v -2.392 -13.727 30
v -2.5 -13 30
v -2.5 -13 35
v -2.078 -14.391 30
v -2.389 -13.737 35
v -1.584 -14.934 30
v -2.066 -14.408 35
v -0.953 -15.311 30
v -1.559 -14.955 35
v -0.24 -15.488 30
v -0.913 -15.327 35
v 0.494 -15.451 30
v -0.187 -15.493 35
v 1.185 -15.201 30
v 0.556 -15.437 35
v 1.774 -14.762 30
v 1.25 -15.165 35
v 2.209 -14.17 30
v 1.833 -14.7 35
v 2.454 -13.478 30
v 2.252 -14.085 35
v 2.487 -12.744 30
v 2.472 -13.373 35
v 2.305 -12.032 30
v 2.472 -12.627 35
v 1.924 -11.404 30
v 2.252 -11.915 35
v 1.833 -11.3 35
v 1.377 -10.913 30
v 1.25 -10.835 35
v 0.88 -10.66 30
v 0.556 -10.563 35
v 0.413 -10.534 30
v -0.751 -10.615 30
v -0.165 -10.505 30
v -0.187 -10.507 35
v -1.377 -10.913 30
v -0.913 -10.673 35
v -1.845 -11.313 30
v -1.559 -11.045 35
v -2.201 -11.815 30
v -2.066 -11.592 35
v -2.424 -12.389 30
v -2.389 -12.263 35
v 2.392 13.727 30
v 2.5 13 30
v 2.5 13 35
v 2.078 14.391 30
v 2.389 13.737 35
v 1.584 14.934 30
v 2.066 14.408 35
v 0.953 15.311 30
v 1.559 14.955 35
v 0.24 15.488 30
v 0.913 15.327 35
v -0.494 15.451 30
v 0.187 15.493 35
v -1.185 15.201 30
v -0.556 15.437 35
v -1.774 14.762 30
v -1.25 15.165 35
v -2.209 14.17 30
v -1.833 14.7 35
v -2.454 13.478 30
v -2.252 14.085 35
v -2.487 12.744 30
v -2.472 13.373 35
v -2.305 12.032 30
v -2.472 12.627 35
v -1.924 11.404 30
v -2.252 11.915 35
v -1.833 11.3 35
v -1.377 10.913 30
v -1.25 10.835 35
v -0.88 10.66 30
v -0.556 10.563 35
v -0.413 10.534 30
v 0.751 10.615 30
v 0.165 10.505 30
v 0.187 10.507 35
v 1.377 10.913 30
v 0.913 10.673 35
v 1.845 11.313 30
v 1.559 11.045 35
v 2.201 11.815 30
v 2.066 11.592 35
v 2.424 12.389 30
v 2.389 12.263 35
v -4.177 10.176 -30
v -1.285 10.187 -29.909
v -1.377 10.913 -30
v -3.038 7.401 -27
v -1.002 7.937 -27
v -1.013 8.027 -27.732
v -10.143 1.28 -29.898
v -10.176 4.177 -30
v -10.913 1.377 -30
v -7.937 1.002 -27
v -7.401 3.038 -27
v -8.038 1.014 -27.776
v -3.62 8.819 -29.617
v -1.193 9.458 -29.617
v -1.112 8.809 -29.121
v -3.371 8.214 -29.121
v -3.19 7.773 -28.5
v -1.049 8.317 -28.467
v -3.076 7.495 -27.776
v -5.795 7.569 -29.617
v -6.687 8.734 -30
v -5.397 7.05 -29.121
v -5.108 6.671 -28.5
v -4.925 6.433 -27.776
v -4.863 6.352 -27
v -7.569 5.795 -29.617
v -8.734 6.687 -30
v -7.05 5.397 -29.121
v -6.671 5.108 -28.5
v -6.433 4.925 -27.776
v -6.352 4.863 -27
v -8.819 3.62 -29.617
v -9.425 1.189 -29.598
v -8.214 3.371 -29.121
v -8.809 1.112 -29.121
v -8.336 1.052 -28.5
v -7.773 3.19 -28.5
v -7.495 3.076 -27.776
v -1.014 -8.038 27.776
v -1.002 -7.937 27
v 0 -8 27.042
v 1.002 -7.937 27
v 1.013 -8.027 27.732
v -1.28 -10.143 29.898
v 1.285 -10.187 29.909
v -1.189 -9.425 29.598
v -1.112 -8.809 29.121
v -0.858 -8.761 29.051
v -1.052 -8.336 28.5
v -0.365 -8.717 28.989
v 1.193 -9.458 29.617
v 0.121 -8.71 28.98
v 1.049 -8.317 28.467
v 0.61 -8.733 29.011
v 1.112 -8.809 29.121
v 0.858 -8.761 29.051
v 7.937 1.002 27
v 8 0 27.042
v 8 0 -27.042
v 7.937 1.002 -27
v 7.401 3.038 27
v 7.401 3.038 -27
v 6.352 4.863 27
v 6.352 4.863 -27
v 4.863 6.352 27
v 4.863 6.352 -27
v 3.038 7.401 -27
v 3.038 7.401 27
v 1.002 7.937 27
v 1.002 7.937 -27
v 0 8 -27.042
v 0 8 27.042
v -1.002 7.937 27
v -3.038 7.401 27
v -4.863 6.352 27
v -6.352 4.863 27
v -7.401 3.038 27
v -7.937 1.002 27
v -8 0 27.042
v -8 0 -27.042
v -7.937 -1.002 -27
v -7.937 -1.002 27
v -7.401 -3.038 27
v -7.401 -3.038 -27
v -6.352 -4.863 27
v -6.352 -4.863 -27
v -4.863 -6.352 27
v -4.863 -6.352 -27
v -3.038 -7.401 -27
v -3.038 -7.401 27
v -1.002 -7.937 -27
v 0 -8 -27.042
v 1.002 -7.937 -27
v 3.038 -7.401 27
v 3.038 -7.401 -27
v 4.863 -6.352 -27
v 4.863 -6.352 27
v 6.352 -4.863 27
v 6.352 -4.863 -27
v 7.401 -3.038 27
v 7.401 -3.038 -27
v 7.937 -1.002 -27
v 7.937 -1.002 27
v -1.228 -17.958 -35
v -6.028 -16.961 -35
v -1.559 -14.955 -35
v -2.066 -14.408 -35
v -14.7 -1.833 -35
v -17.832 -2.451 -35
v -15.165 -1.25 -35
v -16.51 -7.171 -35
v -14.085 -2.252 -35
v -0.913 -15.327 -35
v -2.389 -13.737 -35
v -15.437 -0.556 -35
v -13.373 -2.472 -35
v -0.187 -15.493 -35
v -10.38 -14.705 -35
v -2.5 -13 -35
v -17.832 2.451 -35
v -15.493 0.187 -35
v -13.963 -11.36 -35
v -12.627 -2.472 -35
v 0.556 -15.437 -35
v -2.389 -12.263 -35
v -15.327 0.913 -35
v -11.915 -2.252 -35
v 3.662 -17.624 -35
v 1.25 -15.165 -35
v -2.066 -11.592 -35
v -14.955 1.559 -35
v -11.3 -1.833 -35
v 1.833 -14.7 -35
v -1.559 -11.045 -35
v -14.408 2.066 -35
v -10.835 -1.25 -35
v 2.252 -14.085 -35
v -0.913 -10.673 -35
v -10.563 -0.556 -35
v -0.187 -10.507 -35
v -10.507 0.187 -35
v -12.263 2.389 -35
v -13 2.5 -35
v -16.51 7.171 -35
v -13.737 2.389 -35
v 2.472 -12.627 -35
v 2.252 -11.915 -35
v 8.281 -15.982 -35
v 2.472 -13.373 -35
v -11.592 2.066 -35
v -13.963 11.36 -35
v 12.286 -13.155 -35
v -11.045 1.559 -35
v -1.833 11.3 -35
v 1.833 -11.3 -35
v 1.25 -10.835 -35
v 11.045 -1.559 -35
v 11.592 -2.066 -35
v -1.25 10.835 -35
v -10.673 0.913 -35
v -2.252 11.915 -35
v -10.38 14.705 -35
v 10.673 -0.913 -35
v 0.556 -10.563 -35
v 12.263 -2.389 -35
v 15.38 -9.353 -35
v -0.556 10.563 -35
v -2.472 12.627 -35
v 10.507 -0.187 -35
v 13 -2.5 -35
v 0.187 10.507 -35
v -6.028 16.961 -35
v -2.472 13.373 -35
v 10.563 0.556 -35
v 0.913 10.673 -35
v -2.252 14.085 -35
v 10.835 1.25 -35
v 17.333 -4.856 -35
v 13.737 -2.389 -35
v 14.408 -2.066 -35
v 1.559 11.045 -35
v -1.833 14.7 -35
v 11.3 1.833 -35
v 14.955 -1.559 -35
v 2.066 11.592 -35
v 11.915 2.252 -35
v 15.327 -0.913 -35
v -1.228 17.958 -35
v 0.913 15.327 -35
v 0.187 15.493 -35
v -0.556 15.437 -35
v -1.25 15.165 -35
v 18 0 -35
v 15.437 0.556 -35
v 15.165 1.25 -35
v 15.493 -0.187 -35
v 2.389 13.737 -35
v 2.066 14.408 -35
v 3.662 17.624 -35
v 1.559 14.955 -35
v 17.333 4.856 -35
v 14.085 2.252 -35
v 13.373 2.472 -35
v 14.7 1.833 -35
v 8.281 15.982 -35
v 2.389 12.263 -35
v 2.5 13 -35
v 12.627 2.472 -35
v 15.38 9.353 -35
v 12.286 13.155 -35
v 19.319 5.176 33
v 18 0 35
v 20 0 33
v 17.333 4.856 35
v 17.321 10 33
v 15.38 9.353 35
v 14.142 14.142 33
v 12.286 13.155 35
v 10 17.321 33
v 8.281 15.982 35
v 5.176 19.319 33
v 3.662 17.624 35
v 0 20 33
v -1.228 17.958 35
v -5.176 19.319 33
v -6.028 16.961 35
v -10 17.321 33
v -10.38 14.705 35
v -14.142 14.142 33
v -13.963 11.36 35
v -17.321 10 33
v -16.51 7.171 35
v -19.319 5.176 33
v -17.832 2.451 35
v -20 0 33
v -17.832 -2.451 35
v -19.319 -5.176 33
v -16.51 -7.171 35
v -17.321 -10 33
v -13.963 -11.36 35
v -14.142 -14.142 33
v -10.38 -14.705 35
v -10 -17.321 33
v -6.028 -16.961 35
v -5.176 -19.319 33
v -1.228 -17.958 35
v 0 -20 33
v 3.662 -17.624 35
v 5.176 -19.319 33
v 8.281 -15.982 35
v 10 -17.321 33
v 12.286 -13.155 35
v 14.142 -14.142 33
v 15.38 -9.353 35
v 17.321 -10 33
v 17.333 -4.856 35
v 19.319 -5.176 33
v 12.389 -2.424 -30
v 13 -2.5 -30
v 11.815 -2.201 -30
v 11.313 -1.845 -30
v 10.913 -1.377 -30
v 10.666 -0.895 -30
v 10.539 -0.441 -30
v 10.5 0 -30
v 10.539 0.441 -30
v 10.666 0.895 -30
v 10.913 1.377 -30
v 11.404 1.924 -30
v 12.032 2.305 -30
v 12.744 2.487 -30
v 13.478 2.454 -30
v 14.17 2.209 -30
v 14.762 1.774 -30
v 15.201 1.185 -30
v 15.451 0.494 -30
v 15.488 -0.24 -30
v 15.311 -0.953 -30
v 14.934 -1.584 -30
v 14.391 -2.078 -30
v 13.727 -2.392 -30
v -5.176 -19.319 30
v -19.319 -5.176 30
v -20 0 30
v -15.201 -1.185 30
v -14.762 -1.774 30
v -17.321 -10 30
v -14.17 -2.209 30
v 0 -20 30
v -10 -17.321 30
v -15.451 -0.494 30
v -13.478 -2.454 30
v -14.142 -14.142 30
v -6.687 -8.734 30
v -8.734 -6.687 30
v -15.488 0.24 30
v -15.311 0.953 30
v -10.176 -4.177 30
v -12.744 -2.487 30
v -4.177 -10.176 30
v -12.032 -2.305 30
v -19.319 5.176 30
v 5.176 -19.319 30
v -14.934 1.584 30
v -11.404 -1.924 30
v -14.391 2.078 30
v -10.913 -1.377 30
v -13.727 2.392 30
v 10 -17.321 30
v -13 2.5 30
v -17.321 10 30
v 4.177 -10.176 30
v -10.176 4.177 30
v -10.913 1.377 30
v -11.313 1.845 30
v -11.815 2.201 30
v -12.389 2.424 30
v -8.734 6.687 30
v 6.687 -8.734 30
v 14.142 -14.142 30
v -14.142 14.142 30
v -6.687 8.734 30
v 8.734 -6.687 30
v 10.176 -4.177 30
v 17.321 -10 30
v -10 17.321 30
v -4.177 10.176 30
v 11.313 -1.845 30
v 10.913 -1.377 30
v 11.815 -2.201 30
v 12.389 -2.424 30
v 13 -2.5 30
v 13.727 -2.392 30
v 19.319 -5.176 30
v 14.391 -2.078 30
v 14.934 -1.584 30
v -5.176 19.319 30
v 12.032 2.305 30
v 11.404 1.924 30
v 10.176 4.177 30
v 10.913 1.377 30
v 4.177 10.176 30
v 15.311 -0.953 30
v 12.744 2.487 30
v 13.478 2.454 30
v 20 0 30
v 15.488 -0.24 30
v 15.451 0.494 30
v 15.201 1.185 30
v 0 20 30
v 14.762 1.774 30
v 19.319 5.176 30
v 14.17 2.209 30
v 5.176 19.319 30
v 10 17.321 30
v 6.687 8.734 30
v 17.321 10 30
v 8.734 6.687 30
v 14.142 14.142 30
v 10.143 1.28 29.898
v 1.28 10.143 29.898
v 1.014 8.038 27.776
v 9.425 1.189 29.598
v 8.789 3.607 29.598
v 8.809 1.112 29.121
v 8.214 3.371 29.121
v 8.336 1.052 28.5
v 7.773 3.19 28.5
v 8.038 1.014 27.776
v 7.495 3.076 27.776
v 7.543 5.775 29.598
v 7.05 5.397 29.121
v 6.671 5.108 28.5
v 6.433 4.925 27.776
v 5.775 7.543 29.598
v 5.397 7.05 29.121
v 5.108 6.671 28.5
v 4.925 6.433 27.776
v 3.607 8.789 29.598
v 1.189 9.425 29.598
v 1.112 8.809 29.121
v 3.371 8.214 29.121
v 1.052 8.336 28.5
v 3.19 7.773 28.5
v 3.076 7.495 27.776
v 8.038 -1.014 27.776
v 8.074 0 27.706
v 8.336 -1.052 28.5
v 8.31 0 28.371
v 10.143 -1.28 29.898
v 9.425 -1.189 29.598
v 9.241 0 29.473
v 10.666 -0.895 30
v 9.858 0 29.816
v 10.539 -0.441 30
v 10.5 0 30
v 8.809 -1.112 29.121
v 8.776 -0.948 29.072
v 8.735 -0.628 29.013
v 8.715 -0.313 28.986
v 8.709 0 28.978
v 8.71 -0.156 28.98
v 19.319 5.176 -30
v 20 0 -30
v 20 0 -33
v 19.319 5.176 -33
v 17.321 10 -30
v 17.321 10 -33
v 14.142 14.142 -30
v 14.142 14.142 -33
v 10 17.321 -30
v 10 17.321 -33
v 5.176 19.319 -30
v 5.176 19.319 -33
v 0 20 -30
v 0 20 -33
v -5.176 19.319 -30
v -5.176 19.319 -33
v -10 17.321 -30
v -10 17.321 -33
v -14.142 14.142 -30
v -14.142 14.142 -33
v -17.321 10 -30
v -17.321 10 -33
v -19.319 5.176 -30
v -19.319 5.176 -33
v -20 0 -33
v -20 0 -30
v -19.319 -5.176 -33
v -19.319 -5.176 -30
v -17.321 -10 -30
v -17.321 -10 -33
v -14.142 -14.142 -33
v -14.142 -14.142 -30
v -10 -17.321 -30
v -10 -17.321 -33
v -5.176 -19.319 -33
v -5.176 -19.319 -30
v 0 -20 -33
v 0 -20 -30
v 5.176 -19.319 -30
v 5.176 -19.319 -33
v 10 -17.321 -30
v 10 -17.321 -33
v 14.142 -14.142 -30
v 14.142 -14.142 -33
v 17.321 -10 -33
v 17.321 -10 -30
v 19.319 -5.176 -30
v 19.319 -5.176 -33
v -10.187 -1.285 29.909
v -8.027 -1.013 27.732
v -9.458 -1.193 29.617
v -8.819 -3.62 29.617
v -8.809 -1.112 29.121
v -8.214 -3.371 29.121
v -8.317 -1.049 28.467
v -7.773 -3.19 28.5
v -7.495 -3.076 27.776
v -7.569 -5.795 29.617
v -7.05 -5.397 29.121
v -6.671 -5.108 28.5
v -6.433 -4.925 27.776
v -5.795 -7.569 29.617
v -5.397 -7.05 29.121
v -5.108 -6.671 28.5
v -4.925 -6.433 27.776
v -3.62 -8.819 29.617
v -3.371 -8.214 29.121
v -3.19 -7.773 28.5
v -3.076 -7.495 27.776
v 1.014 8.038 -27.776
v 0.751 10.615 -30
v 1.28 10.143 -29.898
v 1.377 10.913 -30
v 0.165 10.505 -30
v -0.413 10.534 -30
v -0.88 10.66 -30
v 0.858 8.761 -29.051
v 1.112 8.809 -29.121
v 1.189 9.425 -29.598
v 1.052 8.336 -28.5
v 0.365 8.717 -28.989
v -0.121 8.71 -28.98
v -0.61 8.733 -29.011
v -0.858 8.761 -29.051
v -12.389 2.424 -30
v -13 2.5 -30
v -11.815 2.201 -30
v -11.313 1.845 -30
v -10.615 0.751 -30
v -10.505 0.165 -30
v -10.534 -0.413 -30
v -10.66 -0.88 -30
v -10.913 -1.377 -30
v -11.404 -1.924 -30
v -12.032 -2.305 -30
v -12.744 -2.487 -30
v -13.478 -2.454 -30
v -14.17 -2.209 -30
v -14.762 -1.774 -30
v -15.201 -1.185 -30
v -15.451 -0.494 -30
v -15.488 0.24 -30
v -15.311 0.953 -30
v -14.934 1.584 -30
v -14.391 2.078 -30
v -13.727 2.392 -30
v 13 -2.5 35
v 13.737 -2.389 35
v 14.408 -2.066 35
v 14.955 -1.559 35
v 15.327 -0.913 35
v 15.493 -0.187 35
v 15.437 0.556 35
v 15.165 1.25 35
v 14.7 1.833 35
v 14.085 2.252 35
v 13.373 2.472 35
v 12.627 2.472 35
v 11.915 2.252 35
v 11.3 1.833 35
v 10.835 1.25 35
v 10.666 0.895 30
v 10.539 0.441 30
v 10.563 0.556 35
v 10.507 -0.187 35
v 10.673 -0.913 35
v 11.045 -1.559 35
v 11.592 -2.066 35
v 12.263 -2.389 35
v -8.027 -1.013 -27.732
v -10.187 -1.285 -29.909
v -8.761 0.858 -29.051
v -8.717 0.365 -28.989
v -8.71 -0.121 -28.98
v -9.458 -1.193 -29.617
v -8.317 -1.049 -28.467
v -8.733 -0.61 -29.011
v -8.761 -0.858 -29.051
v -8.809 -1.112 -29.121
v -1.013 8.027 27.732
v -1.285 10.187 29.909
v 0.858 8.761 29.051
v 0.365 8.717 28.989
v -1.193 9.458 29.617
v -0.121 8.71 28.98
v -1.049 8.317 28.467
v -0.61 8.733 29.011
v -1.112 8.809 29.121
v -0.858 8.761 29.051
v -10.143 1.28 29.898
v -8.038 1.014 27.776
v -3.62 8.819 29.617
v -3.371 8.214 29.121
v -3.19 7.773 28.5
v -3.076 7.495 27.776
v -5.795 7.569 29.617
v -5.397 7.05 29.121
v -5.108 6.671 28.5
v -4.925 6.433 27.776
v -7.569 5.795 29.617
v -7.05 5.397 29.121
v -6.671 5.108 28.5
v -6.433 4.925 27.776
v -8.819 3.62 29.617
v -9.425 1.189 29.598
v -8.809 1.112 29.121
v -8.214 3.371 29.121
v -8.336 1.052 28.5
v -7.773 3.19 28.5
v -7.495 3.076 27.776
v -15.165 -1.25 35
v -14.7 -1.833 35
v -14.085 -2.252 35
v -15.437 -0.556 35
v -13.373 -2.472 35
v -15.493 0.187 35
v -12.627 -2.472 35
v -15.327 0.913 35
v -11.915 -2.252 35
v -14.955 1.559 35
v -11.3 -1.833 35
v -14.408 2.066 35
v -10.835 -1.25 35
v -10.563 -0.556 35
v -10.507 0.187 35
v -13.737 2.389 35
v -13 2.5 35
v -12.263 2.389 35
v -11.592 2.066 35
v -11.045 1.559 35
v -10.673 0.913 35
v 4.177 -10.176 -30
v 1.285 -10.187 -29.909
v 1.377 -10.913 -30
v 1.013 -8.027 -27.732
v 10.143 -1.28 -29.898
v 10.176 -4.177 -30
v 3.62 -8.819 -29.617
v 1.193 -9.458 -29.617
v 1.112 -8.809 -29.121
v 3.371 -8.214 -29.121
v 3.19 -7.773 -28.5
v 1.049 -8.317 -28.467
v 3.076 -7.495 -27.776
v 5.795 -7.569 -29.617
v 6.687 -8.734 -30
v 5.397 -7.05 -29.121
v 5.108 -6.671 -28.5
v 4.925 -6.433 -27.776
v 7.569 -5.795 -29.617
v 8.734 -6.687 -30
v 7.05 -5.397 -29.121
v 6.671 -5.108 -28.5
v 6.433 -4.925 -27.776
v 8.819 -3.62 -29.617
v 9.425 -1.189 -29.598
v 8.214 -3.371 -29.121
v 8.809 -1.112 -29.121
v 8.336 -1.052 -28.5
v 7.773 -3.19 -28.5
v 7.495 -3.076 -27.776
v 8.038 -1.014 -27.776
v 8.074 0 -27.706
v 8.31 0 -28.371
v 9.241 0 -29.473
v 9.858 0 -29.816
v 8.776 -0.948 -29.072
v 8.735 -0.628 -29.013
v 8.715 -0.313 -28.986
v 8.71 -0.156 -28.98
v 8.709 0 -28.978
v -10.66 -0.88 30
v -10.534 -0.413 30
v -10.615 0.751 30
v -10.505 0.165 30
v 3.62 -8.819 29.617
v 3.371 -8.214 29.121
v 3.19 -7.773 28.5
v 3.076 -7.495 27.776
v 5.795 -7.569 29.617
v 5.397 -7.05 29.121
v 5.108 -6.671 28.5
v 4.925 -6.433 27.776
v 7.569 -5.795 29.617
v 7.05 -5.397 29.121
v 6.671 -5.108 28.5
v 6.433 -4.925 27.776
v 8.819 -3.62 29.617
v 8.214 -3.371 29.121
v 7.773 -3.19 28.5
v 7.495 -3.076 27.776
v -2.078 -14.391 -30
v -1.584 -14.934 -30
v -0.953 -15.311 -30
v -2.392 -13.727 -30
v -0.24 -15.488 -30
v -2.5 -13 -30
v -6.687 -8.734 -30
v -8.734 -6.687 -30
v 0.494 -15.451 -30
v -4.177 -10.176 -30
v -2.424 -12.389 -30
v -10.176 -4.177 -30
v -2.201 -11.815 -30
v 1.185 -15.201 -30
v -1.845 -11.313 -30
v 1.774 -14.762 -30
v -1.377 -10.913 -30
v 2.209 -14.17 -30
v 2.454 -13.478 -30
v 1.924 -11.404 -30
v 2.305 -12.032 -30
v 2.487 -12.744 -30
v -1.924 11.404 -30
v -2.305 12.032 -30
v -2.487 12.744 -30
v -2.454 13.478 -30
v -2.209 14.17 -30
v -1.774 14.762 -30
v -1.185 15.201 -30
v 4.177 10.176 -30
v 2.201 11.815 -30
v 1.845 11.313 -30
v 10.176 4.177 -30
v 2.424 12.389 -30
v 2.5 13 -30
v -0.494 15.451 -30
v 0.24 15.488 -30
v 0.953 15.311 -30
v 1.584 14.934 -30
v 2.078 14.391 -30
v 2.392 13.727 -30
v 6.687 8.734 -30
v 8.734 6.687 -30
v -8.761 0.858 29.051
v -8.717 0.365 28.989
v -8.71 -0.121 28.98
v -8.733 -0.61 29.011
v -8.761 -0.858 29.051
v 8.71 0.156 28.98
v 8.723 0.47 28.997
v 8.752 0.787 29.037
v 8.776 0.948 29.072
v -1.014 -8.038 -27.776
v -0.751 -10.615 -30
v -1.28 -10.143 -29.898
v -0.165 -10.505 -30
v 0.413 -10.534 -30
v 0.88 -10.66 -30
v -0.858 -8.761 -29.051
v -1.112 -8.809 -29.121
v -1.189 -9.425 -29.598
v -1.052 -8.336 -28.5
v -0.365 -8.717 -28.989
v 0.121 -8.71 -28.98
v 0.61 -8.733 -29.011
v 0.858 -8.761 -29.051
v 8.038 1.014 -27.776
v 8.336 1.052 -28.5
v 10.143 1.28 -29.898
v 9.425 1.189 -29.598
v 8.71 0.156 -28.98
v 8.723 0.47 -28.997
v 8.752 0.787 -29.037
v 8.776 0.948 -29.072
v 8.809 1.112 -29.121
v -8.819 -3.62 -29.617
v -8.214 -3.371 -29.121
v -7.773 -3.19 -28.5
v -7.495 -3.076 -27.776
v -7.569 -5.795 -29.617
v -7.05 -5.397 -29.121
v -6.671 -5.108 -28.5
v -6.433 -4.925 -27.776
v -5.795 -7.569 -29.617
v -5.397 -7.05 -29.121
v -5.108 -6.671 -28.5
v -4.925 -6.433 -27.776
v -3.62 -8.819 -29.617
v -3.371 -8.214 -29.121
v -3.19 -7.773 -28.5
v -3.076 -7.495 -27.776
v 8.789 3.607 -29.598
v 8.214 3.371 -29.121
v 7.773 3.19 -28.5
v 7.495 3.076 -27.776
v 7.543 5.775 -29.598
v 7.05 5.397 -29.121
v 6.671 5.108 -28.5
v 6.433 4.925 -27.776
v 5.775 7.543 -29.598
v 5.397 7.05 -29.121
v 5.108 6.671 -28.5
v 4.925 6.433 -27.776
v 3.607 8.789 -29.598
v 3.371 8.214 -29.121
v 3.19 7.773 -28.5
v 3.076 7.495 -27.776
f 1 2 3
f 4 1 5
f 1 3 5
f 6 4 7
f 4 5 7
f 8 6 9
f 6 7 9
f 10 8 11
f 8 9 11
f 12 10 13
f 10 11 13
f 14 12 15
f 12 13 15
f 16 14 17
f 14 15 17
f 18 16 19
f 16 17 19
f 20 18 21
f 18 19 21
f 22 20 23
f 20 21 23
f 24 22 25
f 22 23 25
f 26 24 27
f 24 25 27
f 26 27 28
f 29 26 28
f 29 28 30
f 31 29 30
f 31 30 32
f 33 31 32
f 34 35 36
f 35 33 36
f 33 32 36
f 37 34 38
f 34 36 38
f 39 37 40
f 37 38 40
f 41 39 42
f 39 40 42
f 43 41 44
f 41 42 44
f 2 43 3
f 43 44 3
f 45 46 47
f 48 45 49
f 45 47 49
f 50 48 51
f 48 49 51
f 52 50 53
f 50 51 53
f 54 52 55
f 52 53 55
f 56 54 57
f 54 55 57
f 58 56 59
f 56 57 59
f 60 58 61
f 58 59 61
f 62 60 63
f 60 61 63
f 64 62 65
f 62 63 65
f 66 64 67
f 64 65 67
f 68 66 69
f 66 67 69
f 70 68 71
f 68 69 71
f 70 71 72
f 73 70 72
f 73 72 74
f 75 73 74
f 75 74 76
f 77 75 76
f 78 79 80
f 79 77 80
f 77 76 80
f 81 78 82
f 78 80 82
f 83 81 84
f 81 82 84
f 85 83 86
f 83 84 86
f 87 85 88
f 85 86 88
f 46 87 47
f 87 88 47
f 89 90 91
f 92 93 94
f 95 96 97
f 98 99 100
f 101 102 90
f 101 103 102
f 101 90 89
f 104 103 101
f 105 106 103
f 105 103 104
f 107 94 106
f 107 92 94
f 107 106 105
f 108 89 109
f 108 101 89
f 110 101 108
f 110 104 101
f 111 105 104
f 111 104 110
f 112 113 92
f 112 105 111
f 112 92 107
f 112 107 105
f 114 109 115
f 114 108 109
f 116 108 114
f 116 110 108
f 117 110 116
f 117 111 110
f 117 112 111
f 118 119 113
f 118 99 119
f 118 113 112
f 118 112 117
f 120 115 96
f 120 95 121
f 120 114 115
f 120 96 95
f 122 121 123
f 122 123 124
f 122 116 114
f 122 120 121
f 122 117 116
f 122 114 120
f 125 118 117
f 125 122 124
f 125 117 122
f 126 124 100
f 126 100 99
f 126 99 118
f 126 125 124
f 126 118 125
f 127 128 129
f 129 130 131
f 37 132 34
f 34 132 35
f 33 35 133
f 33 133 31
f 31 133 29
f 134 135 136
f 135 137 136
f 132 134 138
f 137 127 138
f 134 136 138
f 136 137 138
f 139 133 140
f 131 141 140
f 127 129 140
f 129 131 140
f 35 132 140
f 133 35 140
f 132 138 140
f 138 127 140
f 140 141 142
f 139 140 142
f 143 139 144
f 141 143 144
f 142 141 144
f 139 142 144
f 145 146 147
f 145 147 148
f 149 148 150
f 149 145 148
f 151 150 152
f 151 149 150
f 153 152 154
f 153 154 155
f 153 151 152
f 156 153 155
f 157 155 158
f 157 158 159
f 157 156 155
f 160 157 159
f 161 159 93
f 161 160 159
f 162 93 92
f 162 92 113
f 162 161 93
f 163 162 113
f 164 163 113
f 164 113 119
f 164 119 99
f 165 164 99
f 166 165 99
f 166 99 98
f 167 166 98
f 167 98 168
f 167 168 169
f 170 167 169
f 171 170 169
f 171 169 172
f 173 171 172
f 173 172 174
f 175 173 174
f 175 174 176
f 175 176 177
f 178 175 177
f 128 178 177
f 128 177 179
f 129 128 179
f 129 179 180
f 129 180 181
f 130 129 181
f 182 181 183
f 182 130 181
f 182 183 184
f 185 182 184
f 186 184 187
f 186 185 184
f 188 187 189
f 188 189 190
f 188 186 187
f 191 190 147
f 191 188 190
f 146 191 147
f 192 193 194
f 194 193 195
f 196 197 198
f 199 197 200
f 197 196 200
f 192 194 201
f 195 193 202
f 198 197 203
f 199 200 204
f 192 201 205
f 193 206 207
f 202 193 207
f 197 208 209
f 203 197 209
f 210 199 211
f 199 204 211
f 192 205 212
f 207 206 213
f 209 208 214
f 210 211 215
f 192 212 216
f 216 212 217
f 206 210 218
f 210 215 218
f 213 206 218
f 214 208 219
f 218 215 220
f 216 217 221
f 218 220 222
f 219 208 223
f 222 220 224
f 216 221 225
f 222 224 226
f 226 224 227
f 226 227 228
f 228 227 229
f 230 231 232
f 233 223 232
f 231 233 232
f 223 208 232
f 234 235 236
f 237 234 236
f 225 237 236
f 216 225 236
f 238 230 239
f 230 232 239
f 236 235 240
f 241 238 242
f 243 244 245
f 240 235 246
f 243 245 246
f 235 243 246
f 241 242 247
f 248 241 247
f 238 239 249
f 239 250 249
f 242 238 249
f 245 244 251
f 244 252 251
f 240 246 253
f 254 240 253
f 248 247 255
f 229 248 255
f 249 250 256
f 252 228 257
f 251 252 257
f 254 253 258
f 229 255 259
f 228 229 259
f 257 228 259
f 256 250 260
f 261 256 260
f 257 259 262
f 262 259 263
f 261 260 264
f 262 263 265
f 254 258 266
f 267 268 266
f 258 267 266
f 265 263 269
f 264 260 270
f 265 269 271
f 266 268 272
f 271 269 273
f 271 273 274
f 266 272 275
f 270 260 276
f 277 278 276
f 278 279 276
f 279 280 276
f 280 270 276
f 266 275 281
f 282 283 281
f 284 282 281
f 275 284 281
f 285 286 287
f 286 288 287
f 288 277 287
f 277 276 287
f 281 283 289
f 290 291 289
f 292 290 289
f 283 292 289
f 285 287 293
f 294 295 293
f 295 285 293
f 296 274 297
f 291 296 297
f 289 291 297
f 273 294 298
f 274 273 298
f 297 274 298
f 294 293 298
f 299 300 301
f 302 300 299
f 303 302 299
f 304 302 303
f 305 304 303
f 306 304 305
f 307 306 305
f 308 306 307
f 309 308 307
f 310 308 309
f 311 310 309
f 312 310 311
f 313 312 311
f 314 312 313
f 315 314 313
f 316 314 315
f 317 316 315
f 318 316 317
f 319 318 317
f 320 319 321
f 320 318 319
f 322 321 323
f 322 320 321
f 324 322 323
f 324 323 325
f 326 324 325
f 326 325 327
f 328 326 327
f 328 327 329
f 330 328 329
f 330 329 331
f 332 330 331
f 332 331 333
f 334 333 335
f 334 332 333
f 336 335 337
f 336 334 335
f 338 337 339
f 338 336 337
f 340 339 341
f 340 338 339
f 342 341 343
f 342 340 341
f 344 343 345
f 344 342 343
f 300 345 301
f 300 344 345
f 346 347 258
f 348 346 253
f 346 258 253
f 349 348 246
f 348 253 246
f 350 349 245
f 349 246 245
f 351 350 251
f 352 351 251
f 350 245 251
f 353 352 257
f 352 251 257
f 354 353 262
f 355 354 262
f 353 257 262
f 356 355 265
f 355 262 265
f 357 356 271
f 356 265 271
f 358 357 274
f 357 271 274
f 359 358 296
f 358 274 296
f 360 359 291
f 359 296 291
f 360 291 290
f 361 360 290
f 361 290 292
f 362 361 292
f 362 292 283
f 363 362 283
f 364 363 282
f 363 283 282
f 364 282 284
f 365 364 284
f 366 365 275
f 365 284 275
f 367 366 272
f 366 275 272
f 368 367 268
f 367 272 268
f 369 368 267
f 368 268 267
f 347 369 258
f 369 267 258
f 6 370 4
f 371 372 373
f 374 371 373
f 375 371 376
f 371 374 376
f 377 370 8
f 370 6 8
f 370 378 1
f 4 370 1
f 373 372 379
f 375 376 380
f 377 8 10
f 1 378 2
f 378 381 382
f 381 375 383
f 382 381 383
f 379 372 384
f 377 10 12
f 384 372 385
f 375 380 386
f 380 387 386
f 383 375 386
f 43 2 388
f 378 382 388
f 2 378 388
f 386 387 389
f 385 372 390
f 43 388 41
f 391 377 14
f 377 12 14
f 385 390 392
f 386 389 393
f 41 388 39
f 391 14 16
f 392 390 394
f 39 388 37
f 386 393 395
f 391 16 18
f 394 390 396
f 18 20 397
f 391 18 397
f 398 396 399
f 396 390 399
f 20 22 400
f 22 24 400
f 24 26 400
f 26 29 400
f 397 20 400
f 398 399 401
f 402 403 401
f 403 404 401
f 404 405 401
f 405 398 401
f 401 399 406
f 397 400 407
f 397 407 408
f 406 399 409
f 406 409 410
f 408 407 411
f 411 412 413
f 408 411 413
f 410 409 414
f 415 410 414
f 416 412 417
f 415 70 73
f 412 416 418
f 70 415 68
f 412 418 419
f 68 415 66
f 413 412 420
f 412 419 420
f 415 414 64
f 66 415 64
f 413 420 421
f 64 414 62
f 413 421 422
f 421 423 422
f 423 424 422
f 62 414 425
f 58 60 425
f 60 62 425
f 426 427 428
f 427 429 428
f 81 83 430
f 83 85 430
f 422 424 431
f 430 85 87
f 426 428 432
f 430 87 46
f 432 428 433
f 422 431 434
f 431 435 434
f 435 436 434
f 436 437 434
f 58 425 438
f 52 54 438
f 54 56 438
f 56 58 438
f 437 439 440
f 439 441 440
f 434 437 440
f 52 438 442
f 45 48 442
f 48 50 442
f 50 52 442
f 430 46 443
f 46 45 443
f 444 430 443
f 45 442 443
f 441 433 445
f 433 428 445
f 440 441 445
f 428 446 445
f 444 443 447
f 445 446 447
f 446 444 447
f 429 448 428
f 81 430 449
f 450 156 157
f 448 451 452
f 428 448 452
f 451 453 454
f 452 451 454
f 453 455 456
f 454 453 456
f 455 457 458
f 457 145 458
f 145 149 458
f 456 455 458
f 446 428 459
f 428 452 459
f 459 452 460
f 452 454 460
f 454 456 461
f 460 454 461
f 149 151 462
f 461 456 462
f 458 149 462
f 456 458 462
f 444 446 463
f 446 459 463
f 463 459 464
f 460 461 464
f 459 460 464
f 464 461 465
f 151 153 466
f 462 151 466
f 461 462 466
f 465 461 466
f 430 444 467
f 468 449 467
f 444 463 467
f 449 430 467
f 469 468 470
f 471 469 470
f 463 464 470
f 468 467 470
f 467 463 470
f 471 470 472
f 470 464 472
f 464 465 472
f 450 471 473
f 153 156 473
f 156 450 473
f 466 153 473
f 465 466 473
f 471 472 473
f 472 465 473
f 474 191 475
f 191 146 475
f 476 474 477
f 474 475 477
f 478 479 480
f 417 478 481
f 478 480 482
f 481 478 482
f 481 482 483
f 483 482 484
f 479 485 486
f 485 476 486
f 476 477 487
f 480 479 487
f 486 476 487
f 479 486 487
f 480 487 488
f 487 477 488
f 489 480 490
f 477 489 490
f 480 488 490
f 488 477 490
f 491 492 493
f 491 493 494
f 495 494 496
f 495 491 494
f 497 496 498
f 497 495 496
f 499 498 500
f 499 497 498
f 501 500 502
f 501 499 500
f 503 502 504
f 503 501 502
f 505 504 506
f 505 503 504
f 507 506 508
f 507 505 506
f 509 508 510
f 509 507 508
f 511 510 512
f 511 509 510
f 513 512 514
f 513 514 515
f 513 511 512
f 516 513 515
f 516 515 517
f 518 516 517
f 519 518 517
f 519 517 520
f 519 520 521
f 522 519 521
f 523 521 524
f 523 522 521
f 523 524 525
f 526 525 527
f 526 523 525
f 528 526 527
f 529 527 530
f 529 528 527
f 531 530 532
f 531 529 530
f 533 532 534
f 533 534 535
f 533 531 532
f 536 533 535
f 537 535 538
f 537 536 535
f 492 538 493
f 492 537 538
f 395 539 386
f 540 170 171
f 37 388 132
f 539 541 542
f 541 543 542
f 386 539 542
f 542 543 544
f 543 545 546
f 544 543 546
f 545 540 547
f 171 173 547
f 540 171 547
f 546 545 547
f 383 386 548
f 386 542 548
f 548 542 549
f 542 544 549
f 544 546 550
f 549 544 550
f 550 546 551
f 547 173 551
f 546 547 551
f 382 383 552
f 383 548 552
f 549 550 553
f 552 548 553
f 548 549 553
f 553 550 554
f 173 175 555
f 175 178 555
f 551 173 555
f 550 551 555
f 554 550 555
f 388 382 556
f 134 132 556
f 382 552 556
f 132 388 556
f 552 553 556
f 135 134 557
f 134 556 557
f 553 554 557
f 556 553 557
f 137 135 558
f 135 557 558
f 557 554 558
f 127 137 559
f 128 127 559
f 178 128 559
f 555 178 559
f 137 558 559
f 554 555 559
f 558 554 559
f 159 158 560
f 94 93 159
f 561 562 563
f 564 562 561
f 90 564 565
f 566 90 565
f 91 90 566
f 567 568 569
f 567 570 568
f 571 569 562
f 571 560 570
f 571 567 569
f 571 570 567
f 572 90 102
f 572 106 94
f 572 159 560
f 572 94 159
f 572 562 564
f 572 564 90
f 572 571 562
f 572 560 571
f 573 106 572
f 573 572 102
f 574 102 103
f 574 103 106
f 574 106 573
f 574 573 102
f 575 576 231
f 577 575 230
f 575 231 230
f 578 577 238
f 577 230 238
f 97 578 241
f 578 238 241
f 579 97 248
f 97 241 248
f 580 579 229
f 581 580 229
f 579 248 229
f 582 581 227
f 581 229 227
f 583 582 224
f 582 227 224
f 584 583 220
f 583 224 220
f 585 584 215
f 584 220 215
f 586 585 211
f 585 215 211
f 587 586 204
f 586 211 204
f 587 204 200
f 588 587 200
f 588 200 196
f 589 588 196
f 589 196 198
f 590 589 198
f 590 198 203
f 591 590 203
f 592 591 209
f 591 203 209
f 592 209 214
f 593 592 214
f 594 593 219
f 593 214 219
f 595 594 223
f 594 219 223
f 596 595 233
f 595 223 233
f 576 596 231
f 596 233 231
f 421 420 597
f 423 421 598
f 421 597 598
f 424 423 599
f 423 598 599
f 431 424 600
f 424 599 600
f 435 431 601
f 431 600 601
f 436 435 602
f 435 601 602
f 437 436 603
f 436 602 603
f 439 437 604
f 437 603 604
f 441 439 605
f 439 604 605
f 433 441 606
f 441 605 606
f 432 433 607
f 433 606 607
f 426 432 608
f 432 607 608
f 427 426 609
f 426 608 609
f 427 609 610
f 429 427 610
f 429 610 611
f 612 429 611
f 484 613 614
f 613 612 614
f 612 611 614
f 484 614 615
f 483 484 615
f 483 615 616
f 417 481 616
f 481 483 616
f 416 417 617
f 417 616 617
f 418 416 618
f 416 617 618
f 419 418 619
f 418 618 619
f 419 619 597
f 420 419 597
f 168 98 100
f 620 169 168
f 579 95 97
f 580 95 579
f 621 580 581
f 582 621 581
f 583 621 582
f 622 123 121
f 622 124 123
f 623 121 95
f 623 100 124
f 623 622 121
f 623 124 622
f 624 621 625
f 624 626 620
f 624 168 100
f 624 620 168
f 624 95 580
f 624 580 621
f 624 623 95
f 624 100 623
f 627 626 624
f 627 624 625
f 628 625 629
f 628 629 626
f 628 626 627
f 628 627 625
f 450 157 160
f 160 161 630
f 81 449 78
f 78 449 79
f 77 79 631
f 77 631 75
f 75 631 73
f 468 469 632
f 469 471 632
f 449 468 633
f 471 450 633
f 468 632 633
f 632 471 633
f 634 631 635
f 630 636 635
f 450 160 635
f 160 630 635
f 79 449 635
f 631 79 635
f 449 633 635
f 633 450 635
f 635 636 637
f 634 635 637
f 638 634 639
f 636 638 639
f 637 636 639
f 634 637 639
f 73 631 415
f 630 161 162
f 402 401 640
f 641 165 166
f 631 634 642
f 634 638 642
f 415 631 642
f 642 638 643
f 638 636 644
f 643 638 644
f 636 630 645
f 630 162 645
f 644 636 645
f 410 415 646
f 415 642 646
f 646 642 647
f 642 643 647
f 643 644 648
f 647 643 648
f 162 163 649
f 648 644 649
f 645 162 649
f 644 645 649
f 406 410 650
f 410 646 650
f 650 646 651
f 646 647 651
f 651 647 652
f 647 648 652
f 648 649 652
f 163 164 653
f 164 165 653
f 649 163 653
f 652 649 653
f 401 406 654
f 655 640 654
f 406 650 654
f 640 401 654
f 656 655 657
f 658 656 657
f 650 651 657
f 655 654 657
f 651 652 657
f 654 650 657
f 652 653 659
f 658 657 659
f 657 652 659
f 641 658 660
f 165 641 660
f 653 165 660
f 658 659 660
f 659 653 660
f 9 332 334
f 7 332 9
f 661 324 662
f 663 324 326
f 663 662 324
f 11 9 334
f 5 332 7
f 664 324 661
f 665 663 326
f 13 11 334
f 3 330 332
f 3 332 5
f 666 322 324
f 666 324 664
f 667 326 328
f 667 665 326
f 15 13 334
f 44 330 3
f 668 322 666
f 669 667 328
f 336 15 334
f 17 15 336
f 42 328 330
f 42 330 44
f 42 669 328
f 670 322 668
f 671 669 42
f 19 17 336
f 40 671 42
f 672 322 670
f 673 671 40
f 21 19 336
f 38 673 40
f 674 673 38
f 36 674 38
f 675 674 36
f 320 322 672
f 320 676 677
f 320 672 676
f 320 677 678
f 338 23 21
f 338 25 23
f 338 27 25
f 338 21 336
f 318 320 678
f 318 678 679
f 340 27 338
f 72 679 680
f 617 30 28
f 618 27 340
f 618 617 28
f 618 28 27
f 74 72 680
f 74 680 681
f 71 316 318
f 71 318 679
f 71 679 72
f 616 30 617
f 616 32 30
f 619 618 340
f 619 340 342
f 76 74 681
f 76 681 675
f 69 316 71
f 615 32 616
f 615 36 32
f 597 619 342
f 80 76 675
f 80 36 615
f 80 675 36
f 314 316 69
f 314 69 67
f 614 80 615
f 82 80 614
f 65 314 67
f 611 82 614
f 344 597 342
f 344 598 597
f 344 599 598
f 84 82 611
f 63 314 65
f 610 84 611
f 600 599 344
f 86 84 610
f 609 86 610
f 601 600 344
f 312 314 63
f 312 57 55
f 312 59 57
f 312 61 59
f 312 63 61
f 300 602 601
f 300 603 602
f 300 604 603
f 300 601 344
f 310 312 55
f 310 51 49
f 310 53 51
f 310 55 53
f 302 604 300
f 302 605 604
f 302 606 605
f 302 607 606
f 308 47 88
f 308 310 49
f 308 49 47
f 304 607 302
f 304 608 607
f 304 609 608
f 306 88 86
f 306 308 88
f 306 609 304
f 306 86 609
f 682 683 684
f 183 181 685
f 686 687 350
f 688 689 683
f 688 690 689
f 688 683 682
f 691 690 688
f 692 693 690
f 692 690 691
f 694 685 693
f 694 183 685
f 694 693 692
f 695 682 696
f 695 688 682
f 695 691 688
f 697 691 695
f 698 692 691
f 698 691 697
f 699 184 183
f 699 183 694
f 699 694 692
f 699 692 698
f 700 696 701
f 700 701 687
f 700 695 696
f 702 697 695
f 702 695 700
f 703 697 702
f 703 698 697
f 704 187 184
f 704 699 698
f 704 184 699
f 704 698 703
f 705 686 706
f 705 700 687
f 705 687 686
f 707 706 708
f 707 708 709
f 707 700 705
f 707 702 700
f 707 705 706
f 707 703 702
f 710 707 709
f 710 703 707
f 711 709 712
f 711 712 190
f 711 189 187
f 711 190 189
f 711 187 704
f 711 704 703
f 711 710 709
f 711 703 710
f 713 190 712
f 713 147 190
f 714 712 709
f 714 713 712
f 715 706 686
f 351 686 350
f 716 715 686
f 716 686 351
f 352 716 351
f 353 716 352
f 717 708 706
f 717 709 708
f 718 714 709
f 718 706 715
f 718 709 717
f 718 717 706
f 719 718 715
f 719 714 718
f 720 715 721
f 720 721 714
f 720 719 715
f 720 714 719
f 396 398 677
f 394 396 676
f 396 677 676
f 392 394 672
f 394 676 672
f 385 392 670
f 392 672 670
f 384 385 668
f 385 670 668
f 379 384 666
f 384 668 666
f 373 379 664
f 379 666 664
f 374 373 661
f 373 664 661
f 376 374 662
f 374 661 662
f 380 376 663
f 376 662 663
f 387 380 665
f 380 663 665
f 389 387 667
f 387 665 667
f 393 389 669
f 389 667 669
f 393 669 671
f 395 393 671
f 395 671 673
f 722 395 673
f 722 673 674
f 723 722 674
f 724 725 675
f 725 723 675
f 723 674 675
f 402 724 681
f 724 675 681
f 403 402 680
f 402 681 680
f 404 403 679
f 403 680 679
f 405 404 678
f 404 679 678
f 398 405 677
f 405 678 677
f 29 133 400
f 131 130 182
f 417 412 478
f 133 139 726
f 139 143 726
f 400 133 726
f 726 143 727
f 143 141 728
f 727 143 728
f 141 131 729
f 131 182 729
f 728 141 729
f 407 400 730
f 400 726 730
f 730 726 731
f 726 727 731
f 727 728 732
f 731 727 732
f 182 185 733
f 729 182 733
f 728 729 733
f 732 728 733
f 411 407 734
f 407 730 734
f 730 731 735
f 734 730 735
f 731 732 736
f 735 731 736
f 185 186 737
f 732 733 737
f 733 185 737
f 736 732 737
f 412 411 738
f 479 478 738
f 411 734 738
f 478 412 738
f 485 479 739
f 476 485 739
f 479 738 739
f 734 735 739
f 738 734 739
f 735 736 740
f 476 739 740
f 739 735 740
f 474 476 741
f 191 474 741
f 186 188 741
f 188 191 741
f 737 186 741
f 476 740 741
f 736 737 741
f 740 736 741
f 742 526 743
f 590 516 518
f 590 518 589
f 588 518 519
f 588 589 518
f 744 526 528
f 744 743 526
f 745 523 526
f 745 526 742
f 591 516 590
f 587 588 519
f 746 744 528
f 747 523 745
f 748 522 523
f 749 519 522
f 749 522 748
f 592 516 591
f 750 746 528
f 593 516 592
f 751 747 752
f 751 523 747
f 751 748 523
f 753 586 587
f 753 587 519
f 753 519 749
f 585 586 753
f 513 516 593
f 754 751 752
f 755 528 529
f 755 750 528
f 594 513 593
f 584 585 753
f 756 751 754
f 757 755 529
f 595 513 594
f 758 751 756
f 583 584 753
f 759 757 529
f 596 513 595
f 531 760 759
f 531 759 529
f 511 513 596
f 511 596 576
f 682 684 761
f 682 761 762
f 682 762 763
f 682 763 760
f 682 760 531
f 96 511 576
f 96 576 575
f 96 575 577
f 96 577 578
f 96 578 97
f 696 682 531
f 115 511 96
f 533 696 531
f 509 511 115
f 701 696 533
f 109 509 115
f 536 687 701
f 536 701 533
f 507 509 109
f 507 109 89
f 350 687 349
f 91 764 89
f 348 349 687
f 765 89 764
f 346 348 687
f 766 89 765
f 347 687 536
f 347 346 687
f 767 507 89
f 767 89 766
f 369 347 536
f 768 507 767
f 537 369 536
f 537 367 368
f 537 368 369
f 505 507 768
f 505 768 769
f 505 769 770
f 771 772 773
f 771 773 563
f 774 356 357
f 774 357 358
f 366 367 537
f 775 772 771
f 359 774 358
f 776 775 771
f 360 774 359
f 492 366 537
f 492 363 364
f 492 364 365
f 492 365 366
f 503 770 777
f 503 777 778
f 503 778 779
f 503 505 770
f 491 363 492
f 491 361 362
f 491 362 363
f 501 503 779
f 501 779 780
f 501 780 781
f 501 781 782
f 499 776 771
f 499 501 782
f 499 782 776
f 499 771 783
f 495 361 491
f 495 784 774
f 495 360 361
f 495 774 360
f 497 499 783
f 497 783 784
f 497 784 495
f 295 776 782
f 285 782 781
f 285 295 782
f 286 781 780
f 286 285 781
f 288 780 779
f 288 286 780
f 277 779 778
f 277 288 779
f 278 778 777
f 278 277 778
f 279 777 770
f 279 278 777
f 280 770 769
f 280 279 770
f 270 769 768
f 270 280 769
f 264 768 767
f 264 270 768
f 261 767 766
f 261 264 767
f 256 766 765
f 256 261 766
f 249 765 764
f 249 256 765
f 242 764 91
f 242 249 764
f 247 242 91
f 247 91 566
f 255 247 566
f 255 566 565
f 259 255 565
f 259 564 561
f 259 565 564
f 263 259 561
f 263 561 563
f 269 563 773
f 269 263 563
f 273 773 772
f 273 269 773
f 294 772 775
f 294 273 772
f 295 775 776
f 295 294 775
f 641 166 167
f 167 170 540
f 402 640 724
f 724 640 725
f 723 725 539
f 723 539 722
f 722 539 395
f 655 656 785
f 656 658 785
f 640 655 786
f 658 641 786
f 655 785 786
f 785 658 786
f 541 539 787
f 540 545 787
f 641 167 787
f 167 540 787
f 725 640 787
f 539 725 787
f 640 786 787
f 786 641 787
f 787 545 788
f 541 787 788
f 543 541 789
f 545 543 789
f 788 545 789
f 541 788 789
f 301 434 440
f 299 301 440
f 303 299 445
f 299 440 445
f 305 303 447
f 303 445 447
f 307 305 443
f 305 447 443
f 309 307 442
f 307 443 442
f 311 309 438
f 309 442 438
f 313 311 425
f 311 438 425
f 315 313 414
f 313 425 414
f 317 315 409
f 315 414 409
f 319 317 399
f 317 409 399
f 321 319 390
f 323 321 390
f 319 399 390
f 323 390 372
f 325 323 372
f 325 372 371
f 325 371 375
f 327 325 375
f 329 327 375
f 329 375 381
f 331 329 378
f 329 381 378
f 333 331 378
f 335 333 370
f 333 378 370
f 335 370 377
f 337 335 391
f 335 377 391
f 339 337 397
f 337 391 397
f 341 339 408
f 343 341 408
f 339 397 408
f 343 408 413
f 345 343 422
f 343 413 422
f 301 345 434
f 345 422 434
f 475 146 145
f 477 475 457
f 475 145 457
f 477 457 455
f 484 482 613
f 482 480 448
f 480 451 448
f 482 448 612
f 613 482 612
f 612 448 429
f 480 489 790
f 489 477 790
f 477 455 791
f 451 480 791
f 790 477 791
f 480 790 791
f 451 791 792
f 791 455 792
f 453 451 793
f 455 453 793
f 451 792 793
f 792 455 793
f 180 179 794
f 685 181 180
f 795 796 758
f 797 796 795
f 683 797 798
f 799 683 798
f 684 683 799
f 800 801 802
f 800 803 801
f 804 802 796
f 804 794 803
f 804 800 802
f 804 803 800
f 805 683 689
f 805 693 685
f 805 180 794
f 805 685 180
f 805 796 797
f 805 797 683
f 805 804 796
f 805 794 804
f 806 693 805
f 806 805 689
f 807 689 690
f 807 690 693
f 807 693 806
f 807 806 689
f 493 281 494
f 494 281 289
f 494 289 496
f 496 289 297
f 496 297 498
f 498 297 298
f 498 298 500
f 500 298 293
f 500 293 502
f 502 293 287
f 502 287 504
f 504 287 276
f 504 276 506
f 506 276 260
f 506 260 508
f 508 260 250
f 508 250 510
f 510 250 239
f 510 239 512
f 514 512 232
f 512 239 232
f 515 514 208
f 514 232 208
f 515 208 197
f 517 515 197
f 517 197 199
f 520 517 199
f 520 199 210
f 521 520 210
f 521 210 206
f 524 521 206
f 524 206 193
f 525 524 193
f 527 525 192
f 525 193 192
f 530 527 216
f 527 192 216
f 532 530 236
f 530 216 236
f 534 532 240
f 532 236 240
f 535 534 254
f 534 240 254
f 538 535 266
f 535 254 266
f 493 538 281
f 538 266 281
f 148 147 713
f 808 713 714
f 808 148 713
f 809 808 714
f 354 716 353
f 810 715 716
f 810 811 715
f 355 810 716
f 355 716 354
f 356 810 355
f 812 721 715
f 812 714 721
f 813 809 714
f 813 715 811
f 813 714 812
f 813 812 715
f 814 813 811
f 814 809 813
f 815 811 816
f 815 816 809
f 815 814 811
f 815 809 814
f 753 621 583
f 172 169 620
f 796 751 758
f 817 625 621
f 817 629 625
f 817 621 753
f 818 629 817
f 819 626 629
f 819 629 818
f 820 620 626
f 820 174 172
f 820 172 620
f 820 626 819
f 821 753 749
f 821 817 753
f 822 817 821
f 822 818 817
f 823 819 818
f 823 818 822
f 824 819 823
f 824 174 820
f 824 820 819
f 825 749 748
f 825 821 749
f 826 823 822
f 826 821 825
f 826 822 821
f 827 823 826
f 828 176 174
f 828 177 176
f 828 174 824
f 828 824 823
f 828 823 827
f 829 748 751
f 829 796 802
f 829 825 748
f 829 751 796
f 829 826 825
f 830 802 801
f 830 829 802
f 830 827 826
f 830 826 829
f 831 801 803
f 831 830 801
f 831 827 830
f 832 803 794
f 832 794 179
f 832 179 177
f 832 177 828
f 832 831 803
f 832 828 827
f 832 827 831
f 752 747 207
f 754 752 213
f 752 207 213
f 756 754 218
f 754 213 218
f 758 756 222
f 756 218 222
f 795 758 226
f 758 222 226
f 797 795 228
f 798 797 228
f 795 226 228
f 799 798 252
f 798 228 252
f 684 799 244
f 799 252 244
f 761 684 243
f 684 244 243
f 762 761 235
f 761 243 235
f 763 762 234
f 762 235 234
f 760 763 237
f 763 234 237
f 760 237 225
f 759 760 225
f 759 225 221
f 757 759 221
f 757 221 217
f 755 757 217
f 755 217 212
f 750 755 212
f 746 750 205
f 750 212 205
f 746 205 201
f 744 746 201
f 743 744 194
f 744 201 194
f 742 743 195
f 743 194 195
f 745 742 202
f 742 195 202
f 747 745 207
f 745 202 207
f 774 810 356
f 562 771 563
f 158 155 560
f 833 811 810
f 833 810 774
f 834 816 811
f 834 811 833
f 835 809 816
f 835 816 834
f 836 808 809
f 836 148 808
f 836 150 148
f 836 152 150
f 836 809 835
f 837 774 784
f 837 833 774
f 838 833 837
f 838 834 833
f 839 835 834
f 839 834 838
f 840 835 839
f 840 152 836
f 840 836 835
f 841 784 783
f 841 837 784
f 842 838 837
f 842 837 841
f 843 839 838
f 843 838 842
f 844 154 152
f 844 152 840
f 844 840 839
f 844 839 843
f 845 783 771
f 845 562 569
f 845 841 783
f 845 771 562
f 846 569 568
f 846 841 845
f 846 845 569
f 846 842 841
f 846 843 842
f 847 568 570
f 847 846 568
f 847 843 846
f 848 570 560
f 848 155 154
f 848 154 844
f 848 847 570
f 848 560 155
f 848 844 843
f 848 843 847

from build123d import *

# Parameters (mm, degrees)
SKETCH1_R                = 8
BOSS_EXTRUDE1_DEPTH      = 30
SKETCH2_R                = 20
BOSS_EXTRUDE2_DEPTH      = 5
CHAMFER1_SIZE            = 2
SKETCH3_R                = 2.5
CUT_EXTRUDE1_DEPTH       = 71.887234394
CIRPATTERN1_COUNT        = 4
FILLET1_R                = 3
MIRROR5_COPY_1_SKETCH_R  = 2.5
MIRROR5_COPY_1_DEPTH     = 71.887234394
MIRROR5_COPY_2_SKETCH_R  = 2.5
MIRROR5_COPY_2_DEPTH     = 71.887234394
MIRROR5_COPY_3_SKETCH_R  = 2.5
MIRROR5_COPY_3_DEPTH     = 71.887234394
CHAMFER1_OF_MIRROR5_SIZE = 2
FILLET1_OF_MIRROR5_R     = 3


with BuildPart() as part:
    # Sketch1 → Boss-Extrude1 (new, symmetric)
    with BuildSketch(Plane.XY):
        Circle(SKETCH1_R)
    extrude(amount=BOSS_EXTRUDE1_DEPTH, both=True)

    # Sketch2 → Boss-Extrude2 (add)
    with BuildSketch(Plane.XY.offset(30)):
        Circle(SKETCH2_R)
    boss_extrude2 = extrude(amount=BOSS_EXTRUDE2_DEPTH)

    # Chamfer1
    chamfer1_edges = [part.edges().sort_by_distance(p)[0] for p in [
        (-20, 0, 35),
    ]]
    chamfer(chamfer1_edges, length=CHAMFER1_SIZE)

    # Sketch3 → Cut-Extrude1 (cut, through all)
    with BuildSketch(Plane.XY.offset(35)):
        with Locations((0, 13)):
            Circle(SKETCH3_R)
    cut_extrude1 = extrude(amount=-CUT_EXTRUDE1_DEPTH, mode=Mode.SUBTRACT)

    # CirPattern1: Cut-Extrude1 ×4 about axis
    cirpattern1_axis = Axis((0, 0, 0), (0, 0, 1))
    for i in range(1, CIRPATTERN1_COUNT):
        add(cut_extrude1.rotate(cirpattern1_axis, i * 360 / CIRPATTERN1_COUNT), mode=Mode.SUBTRACT)

    # Fillet1
    fillet1_edges = [part.edges().sort_by_distance(p)[0] for p in [
        (-8, 0, 30),
    ]]
    fillet(fillet1_edges, radius=FILLET1_R)

    # Mirror5: Boss-Extrude2, Cut-Extrude1 across plane
    add(boss_extrude2.mirror(Plane.XY))
    add(cut_extrude1.mirror(Plane.XY), mode=Mode.SUBTRACT)

    # Mirror5 copy 1 sketch → Mirror5 copy 1 (cut, through all)
    with BuildSketch(Plane.YX.offset(35)):
        with Locations((0, -13)):
            Circle(MIRROR5_COPY_1_SKETCH_R)
    extrude(amount=-MIRROR5_COPY_1_DEPTH, mode=Mode.SUBTRACT)

    # Mirror5 copy 2 sketch → Mirror5 copy 2 (cut, through all)
    with BuildSketch(Plane(origin=(0, 0, -35), x_dir=(-1, 0, 0), z_dir=(0, 0, -1))):
        with Locations((0, -13)):
            Circle(MIRROR5_COPY_2_SKETCH_R)
    extrude(amount=-MIRROR5_COPY_2_DEPTH, mode=Mode.SUBTRACT)

    # Mirror5 copy 3 sketch → Mirror5 copy 3 (cut, through all)
    with BuildSketch(Plane(origin=(0, 0, -35), x_dir=(0, -1, 0), z_dir=(0, 0, -1))):
        with Locations((0, -13)):
            Circle(MIRROR5_COPY_3_SKETCH_R)
    extrude(amount=-MIRROR5_COPY_3_DEPTH, mode=Mode.SUBTRACT)

    # Chamfer1 of Mirror5
    chamfer1_of_mirror5_edges = [part.edges().sort_by_distance(p)[0] for p in [
        (-20, 0, -35),
    ]]
    chamfer(chamfer1_of_mirror5_edges, length=CHAMFER1_OF_MIRROR5_SIZE)

    # Fillet1 of Mirror5
    fillet1_of_mirror5_edges = [part.edges().sort_by_distance(p)[0] for p in [
        (-8, 0, -30),
    ]]
    fillet(fillet1_of_mirror5_edges, radius=FILLET1_OF_MIRROR5_R)


solid = part.part
